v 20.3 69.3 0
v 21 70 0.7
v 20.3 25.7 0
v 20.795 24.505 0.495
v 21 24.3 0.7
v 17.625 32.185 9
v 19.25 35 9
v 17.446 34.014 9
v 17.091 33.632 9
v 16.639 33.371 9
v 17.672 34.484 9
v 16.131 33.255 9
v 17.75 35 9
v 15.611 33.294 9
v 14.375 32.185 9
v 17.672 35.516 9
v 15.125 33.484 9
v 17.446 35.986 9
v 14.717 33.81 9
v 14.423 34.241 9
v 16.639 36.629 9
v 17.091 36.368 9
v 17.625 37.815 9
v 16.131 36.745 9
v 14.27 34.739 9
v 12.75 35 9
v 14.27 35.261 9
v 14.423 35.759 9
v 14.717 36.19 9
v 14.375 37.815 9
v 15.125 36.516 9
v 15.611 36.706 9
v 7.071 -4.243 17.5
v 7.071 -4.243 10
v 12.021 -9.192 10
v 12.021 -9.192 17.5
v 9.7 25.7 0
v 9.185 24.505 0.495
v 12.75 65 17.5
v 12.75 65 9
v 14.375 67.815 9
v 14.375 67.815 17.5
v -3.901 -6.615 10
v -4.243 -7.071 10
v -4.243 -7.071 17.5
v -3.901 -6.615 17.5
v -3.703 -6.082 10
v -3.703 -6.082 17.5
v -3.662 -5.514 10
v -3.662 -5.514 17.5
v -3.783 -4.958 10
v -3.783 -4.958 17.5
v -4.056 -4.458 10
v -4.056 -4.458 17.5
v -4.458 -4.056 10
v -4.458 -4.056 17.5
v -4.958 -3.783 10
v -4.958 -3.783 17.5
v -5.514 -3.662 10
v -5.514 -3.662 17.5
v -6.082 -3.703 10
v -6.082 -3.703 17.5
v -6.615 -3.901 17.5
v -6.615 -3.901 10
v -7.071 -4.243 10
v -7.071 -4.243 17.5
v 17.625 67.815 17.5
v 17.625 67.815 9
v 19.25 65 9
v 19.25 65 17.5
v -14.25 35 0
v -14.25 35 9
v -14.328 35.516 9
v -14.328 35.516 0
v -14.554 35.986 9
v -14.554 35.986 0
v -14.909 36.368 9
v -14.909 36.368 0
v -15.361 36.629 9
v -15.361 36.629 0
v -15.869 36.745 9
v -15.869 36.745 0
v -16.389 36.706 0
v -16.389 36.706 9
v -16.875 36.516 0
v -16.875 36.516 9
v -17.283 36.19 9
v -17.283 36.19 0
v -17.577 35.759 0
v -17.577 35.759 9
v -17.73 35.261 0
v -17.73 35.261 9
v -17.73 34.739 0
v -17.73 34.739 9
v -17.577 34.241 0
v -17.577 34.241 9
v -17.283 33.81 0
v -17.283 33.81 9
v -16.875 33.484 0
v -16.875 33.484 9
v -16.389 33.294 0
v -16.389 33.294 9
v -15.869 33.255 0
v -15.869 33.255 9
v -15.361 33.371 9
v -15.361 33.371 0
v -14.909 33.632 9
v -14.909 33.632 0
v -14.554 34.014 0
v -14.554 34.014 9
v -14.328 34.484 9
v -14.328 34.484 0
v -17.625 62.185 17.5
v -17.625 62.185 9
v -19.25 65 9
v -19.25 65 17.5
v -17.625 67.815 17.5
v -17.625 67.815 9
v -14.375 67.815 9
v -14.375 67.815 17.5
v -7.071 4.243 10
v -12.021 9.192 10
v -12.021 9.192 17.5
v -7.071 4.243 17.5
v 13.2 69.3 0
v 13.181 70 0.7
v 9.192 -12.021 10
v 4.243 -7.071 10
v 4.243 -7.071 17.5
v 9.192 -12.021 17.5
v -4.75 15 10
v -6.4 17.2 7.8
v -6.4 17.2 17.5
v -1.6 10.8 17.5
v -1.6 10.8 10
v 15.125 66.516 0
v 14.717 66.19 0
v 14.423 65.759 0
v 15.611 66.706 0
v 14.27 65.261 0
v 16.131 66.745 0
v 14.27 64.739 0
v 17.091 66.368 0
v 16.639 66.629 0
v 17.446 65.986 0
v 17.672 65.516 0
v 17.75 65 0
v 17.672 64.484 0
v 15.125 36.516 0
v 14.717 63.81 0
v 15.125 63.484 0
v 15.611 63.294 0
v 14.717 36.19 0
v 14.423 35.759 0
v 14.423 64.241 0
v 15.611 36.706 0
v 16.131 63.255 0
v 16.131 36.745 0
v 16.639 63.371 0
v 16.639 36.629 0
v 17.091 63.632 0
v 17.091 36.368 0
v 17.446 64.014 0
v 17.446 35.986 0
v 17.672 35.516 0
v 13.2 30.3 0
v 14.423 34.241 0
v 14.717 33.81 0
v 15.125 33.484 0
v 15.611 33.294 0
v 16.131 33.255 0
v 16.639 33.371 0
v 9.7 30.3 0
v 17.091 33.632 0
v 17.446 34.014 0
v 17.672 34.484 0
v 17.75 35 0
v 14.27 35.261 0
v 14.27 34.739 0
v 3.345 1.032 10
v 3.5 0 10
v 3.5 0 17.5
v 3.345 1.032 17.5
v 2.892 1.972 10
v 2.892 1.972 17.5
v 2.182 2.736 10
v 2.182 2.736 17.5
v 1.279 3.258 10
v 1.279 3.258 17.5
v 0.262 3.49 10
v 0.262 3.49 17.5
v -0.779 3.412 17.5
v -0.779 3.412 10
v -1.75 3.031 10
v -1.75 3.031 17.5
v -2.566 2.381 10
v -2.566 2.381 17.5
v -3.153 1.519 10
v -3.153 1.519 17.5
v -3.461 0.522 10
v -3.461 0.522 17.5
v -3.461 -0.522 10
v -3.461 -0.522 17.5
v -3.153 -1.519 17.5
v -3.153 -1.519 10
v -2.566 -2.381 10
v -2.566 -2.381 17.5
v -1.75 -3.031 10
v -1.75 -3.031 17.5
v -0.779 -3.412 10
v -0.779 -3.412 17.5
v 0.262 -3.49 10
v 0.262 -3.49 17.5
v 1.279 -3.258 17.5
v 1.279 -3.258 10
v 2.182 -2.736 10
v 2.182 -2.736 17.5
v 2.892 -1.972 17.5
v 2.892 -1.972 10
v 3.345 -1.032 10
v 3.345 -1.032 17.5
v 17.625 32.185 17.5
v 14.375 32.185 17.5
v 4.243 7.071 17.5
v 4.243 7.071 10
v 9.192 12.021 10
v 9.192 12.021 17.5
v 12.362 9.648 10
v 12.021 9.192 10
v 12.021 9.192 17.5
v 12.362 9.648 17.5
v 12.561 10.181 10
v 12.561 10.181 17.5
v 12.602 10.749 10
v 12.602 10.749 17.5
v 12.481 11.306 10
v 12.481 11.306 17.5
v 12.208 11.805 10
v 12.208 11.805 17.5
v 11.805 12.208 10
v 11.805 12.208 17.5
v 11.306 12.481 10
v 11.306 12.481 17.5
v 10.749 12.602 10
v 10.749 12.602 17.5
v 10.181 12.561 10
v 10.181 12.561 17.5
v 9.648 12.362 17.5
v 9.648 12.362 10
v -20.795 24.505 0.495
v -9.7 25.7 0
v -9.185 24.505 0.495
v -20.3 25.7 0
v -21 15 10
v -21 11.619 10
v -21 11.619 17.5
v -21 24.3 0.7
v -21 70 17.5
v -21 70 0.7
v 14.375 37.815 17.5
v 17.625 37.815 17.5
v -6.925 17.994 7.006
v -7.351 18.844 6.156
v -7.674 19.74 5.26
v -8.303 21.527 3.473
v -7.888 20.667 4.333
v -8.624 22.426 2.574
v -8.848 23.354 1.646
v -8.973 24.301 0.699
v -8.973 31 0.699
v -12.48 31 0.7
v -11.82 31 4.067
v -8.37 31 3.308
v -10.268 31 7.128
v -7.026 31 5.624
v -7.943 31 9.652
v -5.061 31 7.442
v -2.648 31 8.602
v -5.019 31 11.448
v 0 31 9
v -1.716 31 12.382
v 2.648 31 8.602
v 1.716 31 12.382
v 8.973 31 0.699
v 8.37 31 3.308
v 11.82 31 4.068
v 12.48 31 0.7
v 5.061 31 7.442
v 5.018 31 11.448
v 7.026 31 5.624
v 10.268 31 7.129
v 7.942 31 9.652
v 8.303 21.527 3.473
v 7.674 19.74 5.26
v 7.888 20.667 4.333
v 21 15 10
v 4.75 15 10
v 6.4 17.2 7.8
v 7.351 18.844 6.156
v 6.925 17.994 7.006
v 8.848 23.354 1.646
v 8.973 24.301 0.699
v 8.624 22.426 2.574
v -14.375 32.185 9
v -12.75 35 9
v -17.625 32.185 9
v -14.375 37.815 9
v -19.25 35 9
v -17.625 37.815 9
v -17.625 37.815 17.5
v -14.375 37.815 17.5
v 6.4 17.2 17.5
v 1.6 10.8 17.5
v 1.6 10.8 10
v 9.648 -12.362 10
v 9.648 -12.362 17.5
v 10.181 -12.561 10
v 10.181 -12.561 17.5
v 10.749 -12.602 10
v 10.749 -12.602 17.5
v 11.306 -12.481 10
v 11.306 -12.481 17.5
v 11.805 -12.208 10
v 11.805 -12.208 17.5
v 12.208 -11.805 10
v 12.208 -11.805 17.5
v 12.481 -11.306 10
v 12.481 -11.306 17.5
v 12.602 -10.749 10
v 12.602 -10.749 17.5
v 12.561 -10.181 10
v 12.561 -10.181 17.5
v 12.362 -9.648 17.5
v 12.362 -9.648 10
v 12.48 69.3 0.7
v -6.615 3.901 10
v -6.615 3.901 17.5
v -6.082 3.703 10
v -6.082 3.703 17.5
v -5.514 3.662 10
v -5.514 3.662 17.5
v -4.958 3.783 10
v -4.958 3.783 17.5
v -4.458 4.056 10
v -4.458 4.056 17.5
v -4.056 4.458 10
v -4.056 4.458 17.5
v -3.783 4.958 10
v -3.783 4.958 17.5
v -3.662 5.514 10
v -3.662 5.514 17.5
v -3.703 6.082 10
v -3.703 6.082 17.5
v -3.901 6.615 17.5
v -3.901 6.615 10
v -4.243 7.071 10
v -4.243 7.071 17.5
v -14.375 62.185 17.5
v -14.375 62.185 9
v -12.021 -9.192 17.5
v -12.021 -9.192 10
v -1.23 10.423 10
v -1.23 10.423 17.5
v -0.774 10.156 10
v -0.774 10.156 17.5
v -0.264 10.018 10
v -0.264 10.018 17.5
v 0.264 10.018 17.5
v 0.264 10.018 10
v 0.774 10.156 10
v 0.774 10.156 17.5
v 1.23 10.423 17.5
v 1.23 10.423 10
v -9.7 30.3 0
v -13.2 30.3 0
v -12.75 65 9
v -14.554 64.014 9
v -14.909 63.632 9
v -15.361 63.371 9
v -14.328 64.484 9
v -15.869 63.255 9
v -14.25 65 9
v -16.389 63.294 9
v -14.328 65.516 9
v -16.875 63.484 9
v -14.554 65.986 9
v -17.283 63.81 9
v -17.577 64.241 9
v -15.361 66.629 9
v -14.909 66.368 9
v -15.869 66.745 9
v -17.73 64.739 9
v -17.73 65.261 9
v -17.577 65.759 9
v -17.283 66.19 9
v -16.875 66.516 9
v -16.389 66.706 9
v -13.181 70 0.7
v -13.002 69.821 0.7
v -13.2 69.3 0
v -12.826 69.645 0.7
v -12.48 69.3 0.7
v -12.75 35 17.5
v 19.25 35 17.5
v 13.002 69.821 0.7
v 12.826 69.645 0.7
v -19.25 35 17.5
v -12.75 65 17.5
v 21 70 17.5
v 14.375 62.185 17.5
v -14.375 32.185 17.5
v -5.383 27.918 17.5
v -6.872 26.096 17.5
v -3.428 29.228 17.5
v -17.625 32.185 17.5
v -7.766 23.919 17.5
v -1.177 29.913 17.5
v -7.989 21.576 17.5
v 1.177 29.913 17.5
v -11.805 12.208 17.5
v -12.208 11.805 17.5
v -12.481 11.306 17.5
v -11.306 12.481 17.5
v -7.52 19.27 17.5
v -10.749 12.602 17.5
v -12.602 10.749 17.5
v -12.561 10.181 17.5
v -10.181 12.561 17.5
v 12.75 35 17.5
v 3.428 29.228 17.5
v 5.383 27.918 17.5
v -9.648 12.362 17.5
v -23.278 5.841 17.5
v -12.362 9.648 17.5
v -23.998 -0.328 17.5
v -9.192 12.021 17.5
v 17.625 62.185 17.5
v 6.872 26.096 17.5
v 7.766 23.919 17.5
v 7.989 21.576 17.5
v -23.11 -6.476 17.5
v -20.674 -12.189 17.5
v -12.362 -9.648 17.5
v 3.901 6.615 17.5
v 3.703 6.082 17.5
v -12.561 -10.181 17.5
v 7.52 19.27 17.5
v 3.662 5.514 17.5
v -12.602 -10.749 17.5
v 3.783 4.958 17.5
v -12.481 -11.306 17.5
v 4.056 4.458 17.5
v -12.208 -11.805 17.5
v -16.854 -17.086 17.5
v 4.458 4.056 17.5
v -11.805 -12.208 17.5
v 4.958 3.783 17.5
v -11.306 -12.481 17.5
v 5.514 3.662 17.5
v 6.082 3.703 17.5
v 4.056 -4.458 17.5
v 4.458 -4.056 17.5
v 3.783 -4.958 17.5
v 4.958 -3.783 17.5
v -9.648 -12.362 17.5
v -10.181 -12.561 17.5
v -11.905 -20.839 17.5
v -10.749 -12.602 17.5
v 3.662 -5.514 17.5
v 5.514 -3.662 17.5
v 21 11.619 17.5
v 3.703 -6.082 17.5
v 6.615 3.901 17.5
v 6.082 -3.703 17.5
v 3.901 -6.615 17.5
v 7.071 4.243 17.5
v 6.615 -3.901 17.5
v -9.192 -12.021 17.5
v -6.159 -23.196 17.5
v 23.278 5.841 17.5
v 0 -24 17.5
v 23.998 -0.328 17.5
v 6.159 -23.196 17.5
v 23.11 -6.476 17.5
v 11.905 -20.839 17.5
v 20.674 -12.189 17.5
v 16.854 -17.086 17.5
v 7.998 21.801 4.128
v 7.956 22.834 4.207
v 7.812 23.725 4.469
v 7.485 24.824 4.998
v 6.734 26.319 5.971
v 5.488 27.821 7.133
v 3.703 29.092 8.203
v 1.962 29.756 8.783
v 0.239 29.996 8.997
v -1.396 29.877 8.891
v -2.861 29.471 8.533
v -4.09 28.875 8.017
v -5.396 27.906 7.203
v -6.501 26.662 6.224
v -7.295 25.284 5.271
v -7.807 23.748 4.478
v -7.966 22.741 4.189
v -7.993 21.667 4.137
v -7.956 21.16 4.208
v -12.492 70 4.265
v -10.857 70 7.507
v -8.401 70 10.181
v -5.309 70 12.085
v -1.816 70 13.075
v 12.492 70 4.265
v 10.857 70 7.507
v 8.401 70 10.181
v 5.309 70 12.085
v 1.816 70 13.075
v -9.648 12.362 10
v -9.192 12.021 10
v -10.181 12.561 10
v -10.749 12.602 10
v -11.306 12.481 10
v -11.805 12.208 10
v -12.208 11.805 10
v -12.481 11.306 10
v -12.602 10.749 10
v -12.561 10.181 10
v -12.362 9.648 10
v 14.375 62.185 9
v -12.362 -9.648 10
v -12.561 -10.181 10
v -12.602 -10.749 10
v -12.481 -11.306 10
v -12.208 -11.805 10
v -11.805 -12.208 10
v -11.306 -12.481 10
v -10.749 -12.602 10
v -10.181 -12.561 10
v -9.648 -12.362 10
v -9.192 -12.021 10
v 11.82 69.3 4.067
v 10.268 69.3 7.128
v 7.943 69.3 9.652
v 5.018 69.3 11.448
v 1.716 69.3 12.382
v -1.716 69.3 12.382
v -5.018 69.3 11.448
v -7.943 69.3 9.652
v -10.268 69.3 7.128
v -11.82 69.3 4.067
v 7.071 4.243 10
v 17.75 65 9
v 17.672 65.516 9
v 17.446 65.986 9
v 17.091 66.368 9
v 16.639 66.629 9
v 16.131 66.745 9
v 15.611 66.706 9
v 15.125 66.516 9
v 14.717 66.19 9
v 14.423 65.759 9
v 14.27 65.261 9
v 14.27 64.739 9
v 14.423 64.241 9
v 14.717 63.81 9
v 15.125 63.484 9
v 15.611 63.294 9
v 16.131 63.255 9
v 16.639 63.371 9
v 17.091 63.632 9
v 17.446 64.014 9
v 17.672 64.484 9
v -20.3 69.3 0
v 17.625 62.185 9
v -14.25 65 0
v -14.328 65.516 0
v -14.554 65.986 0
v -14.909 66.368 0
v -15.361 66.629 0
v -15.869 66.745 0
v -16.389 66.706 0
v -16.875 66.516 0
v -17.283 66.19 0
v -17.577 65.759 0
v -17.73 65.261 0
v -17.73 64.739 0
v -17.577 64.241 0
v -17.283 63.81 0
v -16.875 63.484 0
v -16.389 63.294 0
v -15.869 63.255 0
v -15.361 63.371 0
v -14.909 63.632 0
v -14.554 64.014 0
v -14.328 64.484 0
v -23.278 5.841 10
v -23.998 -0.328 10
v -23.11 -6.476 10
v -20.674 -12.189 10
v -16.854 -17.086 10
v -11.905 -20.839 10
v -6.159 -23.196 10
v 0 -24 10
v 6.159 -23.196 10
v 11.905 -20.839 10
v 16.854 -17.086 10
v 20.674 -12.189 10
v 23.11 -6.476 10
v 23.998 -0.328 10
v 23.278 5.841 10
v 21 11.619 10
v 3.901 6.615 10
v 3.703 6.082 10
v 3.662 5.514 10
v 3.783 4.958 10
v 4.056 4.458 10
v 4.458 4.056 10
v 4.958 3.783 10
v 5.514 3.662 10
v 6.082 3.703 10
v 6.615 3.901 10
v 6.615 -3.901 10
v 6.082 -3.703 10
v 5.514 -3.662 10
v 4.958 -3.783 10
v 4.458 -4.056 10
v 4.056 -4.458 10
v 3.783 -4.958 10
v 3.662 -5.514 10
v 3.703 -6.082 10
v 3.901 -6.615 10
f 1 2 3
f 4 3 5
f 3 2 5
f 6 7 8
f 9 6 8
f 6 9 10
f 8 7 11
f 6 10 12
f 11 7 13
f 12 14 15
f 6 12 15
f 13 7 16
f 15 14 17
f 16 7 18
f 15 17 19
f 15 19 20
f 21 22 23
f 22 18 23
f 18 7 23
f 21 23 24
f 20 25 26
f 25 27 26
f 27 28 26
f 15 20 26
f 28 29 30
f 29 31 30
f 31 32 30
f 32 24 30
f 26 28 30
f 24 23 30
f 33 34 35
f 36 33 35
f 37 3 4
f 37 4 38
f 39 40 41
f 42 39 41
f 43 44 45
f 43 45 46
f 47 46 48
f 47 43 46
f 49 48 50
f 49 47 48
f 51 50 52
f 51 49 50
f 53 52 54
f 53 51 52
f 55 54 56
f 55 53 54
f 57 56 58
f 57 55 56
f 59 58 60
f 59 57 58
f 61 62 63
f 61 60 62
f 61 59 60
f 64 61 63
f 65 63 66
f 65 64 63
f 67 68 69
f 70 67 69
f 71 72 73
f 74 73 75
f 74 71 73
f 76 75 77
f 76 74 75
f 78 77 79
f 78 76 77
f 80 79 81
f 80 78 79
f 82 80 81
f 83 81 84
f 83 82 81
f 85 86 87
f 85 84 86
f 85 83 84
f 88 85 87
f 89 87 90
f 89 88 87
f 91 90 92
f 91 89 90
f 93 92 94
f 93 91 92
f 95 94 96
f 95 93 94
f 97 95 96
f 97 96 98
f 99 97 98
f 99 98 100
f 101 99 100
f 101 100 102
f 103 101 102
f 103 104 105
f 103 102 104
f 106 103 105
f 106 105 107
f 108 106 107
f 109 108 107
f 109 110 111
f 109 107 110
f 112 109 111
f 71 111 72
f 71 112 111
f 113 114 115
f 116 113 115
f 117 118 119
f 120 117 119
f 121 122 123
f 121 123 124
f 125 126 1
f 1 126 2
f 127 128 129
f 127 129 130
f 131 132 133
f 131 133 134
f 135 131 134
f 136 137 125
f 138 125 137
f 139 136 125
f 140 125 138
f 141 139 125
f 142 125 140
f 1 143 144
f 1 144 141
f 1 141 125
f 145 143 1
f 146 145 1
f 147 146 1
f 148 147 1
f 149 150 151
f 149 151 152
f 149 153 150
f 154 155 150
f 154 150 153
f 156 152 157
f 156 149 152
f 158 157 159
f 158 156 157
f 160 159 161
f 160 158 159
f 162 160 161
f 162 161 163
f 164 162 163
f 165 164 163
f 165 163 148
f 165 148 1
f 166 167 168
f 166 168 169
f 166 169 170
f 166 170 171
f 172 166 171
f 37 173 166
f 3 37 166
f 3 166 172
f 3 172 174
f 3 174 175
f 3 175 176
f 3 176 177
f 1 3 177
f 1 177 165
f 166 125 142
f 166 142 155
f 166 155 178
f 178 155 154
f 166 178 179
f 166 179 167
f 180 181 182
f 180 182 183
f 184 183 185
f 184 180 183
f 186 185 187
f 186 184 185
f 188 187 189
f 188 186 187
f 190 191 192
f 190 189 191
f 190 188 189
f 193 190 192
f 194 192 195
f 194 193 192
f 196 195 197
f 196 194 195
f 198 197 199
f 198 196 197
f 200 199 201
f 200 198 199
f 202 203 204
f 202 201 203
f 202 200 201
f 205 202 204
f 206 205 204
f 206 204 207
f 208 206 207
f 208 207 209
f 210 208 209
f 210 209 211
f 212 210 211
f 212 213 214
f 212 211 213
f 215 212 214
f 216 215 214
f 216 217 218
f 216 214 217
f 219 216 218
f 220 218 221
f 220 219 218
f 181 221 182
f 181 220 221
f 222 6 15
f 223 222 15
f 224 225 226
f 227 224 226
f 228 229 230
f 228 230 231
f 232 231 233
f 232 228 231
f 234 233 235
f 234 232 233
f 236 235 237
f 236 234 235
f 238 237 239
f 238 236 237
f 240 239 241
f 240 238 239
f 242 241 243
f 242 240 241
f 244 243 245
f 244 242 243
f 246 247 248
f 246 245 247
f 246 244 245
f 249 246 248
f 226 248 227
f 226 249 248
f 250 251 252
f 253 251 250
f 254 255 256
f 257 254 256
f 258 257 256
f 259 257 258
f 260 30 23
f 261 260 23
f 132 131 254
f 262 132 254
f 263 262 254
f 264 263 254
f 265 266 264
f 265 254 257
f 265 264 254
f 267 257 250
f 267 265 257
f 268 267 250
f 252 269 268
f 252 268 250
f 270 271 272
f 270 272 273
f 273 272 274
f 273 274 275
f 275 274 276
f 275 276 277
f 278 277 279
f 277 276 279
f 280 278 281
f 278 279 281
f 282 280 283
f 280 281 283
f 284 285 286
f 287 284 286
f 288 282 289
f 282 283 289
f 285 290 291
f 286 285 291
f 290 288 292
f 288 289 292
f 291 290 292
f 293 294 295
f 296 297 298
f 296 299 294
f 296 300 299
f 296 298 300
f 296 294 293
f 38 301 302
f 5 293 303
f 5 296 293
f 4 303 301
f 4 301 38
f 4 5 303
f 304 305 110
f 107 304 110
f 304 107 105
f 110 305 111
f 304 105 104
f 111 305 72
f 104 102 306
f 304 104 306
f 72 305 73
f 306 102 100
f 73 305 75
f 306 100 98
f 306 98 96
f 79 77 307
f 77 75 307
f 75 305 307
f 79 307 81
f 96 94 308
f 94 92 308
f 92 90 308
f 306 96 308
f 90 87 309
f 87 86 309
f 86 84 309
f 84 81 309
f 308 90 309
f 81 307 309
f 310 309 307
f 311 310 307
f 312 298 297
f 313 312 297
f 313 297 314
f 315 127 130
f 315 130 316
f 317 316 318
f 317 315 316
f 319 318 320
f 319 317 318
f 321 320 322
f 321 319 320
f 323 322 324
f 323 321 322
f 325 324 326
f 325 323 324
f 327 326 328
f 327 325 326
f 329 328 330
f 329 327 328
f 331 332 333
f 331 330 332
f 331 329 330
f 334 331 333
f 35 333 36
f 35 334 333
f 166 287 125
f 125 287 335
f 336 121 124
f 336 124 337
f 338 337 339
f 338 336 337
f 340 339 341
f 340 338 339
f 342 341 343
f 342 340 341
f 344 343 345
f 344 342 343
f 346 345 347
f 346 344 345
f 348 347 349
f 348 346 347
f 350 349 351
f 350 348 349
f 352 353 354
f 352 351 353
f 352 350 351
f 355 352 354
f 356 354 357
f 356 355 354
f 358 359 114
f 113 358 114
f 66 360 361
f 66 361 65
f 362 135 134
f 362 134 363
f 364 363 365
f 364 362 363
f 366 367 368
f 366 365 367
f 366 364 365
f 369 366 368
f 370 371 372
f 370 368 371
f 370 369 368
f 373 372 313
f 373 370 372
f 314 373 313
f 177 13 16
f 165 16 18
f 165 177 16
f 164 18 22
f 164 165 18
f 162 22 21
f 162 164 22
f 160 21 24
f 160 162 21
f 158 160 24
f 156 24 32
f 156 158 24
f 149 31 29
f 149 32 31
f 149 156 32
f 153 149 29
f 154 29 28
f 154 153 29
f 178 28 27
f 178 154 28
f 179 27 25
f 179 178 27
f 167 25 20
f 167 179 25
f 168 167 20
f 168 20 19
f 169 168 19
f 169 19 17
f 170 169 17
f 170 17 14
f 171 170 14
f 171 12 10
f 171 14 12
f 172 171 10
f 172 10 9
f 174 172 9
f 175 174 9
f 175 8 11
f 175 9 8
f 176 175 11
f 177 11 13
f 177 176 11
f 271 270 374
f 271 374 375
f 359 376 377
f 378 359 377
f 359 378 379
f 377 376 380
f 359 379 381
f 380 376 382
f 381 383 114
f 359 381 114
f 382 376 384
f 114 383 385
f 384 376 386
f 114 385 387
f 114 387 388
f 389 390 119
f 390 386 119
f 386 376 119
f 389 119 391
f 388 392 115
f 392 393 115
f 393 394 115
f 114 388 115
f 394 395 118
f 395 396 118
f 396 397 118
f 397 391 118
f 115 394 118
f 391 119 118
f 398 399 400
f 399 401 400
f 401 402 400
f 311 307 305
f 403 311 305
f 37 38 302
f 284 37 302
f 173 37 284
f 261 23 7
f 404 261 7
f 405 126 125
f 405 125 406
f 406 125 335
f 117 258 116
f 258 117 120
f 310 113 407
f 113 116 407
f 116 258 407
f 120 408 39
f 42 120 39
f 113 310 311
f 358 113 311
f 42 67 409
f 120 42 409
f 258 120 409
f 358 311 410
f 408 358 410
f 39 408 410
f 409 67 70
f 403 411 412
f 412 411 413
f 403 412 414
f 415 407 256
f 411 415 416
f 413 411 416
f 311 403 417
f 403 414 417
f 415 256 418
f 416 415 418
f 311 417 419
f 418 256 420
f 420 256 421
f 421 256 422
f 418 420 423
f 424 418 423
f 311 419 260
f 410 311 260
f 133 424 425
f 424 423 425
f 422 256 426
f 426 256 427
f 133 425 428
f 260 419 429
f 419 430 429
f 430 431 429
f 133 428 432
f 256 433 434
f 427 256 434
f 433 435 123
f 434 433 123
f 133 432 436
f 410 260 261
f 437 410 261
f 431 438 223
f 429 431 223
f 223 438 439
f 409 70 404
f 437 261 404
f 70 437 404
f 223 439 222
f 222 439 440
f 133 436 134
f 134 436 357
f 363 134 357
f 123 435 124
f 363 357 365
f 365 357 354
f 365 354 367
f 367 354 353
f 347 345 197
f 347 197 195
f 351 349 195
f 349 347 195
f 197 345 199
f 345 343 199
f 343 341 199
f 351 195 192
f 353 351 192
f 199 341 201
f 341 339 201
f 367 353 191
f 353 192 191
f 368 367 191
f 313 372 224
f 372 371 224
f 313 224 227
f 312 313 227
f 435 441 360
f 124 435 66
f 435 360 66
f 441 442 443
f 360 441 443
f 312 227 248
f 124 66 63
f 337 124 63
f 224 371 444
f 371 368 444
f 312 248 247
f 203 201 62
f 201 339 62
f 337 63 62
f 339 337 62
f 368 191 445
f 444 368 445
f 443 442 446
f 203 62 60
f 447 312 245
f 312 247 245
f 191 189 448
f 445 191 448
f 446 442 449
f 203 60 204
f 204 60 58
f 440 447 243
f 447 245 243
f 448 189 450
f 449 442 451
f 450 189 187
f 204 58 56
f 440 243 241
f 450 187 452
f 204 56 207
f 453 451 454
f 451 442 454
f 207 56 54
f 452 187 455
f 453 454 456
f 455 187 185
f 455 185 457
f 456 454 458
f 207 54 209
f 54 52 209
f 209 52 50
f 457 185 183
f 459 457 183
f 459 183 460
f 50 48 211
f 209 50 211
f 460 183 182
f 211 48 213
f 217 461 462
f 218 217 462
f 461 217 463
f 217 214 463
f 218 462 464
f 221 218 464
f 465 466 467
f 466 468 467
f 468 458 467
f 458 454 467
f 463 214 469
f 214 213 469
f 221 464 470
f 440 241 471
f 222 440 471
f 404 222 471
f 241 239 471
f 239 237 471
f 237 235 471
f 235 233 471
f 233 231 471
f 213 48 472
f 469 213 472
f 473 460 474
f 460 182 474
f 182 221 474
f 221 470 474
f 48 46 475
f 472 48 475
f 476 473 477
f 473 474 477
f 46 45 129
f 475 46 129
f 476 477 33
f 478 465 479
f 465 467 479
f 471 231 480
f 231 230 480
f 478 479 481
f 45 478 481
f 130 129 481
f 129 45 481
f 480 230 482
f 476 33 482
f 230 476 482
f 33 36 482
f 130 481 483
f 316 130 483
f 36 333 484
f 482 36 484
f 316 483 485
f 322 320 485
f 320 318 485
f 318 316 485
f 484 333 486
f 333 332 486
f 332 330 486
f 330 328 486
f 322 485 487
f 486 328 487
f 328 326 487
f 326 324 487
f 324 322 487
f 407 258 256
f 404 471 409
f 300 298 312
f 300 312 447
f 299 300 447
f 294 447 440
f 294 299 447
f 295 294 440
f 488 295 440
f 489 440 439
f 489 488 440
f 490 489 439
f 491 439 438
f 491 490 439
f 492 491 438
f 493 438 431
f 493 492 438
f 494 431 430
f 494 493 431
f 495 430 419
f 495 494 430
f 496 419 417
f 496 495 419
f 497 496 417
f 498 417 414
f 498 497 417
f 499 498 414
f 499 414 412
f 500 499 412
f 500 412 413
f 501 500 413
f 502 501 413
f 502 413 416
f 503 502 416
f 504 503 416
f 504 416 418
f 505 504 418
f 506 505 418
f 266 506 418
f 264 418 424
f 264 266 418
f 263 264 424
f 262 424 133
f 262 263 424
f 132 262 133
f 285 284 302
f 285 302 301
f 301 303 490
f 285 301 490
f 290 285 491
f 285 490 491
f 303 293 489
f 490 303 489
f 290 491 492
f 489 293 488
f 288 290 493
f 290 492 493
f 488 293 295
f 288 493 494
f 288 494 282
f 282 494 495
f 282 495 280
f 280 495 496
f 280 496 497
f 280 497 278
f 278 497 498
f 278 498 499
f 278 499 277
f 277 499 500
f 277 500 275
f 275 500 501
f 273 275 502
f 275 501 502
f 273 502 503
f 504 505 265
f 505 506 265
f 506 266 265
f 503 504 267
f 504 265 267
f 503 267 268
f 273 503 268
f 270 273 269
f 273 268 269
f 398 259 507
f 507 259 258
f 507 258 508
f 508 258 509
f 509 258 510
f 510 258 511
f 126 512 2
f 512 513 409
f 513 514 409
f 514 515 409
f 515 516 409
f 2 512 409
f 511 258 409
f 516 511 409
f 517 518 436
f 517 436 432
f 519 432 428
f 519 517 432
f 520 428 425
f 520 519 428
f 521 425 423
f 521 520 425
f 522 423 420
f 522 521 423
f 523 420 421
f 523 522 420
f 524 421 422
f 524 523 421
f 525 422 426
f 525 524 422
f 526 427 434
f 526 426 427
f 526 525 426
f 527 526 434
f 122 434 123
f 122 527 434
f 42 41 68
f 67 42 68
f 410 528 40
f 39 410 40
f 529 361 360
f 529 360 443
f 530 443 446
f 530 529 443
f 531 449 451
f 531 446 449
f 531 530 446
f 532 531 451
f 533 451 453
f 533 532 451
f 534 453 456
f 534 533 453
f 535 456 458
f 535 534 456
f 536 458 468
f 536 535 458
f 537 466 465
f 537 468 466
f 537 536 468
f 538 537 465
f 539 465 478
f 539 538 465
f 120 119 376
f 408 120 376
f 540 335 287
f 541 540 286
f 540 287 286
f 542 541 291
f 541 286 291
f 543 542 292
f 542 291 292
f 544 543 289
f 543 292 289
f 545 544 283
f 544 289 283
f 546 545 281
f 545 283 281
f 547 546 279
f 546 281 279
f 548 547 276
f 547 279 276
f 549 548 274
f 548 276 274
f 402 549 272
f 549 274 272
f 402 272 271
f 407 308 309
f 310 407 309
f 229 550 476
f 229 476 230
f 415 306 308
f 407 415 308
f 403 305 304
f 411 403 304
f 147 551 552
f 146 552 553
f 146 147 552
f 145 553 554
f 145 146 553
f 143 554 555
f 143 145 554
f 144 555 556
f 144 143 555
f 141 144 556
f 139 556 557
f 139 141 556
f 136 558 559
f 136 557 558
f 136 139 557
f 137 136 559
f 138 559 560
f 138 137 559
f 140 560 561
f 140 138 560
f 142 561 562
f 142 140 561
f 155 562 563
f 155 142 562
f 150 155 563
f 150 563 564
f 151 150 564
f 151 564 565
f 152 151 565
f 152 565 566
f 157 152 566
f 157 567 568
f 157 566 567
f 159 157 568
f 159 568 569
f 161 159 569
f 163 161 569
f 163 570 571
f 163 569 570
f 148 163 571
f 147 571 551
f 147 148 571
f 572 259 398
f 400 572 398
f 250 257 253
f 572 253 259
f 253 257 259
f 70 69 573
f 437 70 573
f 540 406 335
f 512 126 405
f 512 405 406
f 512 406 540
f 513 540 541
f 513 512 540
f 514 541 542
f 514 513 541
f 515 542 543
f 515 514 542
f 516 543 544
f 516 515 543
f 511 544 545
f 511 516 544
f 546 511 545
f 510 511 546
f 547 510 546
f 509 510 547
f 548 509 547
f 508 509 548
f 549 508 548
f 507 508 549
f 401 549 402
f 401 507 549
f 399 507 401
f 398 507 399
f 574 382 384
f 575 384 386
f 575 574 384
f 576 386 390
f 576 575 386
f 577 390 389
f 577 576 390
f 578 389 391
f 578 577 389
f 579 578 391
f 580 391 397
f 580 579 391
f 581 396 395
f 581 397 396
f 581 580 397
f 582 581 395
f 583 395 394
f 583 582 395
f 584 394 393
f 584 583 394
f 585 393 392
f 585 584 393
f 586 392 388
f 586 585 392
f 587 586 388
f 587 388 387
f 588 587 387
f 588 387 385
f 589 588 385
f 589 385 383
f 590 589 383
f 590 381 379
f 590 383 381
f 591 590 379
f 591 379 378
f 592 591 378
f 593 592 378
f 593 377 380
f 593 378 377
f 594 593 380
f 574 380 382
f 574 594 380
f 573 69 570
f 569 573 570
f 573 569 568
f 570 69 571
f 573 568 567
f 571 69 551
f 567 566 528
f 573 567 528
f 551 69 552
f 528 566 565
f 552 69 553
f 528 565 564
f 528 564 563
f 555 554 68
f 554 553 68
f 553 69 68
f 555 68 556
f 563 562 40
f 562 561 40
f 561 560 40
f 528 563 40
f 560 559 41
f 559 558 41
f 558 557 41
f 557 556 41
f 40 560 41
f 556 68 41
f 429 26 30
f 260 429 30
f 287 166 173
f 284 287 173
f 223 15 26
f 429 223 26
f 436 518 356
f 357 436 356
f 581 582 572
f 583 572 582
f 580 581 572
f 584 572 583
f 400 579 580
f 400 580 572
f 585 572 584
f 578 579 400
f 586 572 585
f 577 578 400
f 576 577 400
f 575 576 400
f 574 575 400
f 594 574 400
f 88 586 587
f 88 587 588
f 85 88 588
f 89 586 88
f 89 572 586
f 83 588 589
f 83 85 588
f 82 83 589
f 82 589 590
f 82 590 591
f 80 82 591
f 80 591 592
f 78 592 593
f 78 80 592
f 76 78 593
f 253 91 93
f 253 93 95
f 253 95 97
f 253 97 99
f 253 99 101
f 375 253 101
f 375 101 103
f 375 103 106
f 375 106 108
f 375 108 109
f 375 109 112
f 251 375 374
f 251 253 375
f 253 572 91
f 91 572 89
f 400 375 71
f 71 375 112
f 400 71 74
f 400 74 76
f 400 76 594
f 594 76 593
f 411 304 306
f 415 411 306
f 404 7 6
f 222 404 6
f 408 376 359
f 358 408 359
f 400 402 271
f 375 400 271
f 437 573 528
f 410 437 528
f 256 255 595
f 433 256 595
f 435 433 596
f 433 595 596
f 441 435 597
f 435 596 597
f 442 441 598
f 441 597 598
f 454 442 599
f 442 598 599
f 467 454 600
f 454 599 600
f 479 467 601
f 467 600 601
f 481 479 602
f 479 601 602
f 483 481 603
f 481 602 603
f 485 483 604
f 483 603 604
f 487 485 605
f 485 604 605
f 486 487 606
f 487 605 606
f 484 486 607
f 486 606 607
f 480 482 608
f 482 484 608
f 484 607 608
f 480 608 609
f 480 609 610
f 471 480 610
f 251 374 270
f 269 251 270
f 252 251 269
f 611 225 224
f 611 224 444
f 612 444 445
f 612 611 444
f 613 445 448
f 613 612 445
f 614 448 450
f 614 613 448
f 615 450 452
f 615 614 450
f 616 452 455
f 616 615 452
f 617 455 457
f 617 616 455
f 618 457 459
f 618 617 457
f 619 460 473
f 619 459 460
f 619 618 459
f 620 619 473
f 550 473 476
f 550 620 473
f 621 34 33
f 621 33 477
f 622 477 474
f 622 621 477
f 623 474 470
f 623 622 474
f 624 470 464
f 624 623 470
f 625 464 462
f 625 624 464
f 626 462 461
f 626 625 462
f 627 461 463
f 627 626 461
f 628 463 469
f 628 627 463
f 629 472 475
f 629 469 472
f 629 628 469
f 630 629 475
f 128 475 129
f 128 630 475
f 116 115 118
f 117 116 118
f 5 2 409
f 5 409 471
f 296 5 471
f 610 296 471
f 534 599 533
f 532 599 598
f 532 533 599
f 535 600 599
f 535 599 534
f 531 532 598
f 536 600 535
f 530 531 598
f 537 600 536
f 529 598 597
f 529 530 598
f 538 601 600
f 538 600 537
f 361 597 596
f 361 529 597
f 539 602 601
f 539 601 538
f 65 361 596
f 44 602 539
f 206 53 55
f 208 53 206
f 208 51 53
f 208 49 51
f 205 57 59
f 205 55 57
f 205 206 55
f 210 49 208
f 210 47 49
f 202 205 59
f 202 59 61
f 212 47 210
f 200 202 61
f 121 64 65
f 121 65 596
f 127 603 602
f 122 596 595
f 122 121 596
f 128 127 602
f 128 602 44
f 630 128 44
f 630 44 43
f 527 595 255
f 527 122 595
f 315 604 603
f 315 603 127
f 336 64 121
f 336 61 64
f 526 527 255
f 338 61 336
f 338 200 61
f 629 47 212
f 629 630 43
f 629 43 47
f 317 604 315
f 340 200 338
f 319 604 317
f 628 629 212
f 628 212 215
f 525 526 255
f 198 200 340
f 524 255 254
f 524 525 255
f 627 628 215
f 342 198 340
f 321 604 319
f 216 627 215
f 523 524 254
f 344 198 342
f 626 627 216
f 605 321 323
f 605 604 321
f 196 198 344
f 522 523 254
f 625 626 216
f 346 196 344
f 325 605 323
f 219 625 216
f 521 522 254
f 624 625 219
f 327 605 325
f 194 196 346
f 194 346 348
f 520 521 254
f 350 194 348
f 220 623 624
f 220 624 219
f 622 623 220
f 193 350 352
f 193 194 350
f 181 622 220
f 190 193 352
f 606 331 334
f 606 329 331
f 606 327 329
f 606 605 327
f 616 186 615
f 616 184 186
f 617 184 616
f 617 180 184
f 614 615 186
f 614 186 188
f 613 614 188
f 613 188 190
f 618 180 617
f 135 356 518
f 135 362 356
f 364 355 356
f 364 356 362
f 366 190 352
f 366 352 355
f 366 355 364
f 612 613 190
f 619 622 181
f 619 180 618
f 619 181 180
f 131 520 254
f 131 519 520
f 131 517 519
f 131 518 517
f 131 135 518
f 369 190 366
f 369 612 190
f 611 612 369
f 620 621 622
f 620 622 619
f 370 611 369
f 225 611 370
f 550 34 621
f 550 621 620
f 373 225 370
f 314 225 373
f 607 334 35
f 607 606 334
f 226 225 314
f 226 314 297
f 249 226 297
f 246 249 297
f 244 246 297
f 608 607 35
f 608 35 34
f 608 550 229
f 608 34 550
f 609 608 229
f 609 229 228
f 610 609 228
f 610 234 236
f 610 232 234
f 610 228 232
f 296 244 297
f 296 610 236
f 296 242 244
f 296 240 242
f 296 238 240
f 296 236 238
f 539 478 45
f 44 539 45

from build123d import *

# Parameters (mm, degrees)
EXTRUDE006_DEPTH                     = 10
SKETCH006_AS_DRAWN_R                 = 9
EXTRUDE005_DEPTH                     = 27
EXTRUDE005_ONTO_SKETCH006_ROLL_ANGLE = 90
SKETCH_R                             = 3.5
SKETCH_R_2                           = 1.75
EXTRUDE_DEPTH                        = 30
SKETCH001_AS_DRAWN_R                 = 12.5
EXTRUDE004_DEPTH                     = 50
EXTRUDE004_ONTO_SKETCH001_ROLL_ANGLE = 90
EXTRUDE002_DEPTH                     = 60
SKETCH003_AS_DRAWN_W                 = 50
SKETCH003_AS_DRAWN_H                 = 17.5
EXTRUDE003_DEPTH                     = 98
EXTRUDE003_ONTO_SKETCH003_ROLL_ANGLE = 90
CHAMFER_SIZE                         = 0.7


with BuildPart() as extrude006:
    # Sketch008 → Extrude006 (new body)
    with BuildSketch(Plane(origin=(0, 40, 0), x_dir=(1, 0, 0), z_dir=(0, 0, 1))):
        Polygon((-17.625, -2.185417), (-14.375, -2.185417), (-12.75, -5), (-14.375, -7.814583), (-17.625, -7.814583), (-19.25, -5), align=None)
        Polygon((14.375, -2.185417), (17.625, -2.185417), (19.25, -5), (17.625, -7.814583), (14.375, -7.814583), (12.75, -5), align=None)
        Polygon((14.375, 27.814583), (17.625, 27.814583), (19.25, 25), (17.625, 22.185417), (14.375, 22.185417), (12.75, 25), align=None)
        Polygon((-17.625, 27.814583), (-14.375, 27.814583), (-12.75, 25), (-14.375, 22.185417), (-17.625, 22.185417), (-19.25, 25), align=None)
    extrude(amount=EXTRUDE006_DEPTH)


with BuildPart() as extrude006_1:
    # Extrude006 placement: moved
    add(extrude006.part.moved(Location((0, 0, 9))))


with BuildPart() as extrude005:
    # Sketch006 as drawn → Extrude005 (new)
    with BuildSketch(Plane.XY):
        Circle(SKETCH006_AS_DRAWN_R)
    extrude(amount=-EXTRUDE005_DEPTH)


with BuildPart() as extrude005_1:
    # Extrude005 onto Sketch006 roll: moved
    add(extrude005.part.rotate(Axis((0, 0, 0), (1, 0, 0)), EXTRUDE005_ONTO_SKETCH006_ROLL_ANGLE))


with BuildPart() as extrude005_2:
    # Extrude005 onto Sketch006 placement: moved
    add(extrude005_1.part.moved(Location((0, 33, 0))))


with BuildPart() as extrude005_3:
    # Extrude005 placement: moved
    add(extrude005_2.part.moved(Location((0, -18, 0))))


with BuildPart() as extrude_body:
    # Sketch → Extrude (new body)
    with BuildSketch(Plane.XY):
        Circle(SKETCH_R)
        with Locations((-16, 35)):
            Circle(SKETCH_R_2)
        with Locations((-16, 65)):
            Circle(SKETCH_R_2)
        with Locations((16, 65)):
            Circle(SKETCH_R_2)
        with Locations((16, 35)):
            Circle(SKETCH_R_2)
        with BuildLine():
            ThreePointArc((-12.020815, -9.192388), (-12.020815, -12.020815), (-9.192388, -12.020815))
            Line((-9.192388, -12.020815), (-4.242641, -7.071068))
            ThreePointArc((-4.242641, -7.071068), (-4.242641, -4.242641), (-7.071068, -4.242641))
            Line((-12.020815, -9.192388), (-7.071068, -4.242641))
        make_face()
        with BuildLine():
            ThreePointArc((7.071068, -4.242641), (4.242641, -4.242641), (4.242641, -7.071068))
            Line((4.242641, -7.071068), (9.192388, -12.020815))
            ThreePointArc((9.192388, -12.020815), (12.020815, -12.020815), (12.020815, -9.192388))
            Line((7.071068, -4.242641), (12.020815, -9.192388))
        make_face()
        with BuildLine():
            ThreePointArc((4.242641, 7.071068), (4.242641, 4.242641), (7.071068, 4.242641))
            Line((7.071068, 4.242641), (12.020815, 9.192388))
            ThreePointArc((12.020815, 9.192388), (12.020815, 12.020815), (9.192388, 12.020815))
            Line((4.242641, 7.071068), (9.192388, 12.020815))
        make_face()
        with BuildLine():
            ThreePointArc((-9.192388, 12.020815), (-12.020815, 12.020815), (-12.020815, 9.192388))
            Line((-12.020815, 9.192388), (-7.071068, 4.242641))
            ThreePointArc((-7.071068, 4.242641), (-4.242641, 4.242641), (-4.242641, 7.071068))
            Line((-9.192388, 12.020815), (-4.242641, 7.071068))
        make_face()
        with BuildLine():
            ThreePointArc((6.4, 17.2), (0, 30), (-6.4, 17.2))
            Line((-6.4, 17.2), (-1.6, 10.8))
            ThreePointArc((-1.6, 10.8), (0, 10), (1.6, 10.8))
            Line((6.4, 17.2), (1.6, 10.8))
        make_face()
        with BuildLine():
            ThreePointArc((-21, 11.61895), (0, -24), (21, 11.61895))
            Line((21, 70), (21, 11.61895))
            Line((30, 70), (21, 70))
            Line((30, -30), (30, 70))
            Line((-30, -30), (30, -30))
            Line((-30, 70), (-30, -30))
            Line((-21, 70), (-30, 70))
            Line((-21, 11.61895), (-21, 70))
        make_face()
    extrude(amount=EXTRUDE_DEPTH)


with BuildPart() as extrude004:
    # Sketch001 as drawn → Extrude004 (new)
    with BuildSketch(Plane.XY):
        Circle(SKETCH001_AS_DRAWN_R)
    extrude(amount=-EXTRUDE004_DEPTH)


with BuildPart() as extrude004_1:
    # Extrude004 onto Sketch001 roll: moved
    add(extrude004.part.rotate(Axis((0, 0, 0), (1, 0, 0)), EXTRUDE004_ONTO_SKETCH001_ROLL_ANGLE))


with BuildPart() as extrude004_2:
    # Extrude004 onto Sketch001 placement: moved
    add(extrude004_1.part.moved(Location((0, 32, 0))))


with BuildPart() as extrude004_3:
    # Extrude004 placement: moved
    add(extrude004_2.part.moved(Location((0, -1, 0))))


with BuildPart() as extrude002:
    # Sketch002 → Extrude002 (new body)
    with BuildSketch(Plane.YZ.offset(33)):
        Polygon((-30, 10), (15, 10), (25, 0), (-30, 0), align=None)
    extrude(amount=-EXTRUDE002_DEPTH)


with BuildPart() as chamfer_body:
    # Sketch003 as drawn → Extrude003 (new)
    with BuildSketch(Plane.XY):
        with Locations((0, 8.75)):
            Rectangle(SKETCH003_AS_DRAWN_W, SKETCH003_AS_DRAWN_H)
    extrude(amount=-EXTRUDE003_DEPTH)


with BuildPart() as chamfer_body_1:
    # Extrude003 onto Sketch003 roll: moved
    add(chamfer_body.part.rotate(Axis((0, 0, 0), (1, 0, 0)), EXTRUDE003_ONTO_SKETCH003_ROLL_ANGLE))


with BuildPart() as chamfer_body_2:
    # Extrude003 onto Sketch003 placement: moved
    add(chamfer_body_1.part.moved(Location((0, -28, 0))))

    # Cut: cut Extrude002
    add(extrude002.part, mode=Mode.SUBTRACT)

    # Cut001: cut Extrude004
    add(extrude004_3.part, mode=Mode.SUBTRACT)

    # Cut002: cut Extrude body
    add(extrude_body.part, mode=Mode.SUBTRACT)

    # Cut003: cut Extrude005
    add(extrude005_3.part, mode=Mode.SUBTRACT)

    # Cut004: cut Extrude006
    add(extrude006_1.part, mode=Mode.SUBTRACT)

    # Chamfer
    chamfer_edges = [chamfer_body_2.edges().sort_by_distance(p)[0] for p in [
        (-21, 47.5, 0),
        (16.75, 70, 0),
        (0, 70, 12.5),
        (-16.75, 70, 0),
        (21, 47.5, 0),
        (-15, 25, 0),
        (-9, 28, 0),
        (-12.5, 50.5, 0),
        (-10.75, 31, 0),
        (15, 25, 0),
        (9, 28, 0),
        (10.75, 31, 0),
        (12.5, 50.5, 0),
    ]]
    chamfer(chamfer_edges, length=CHAMFER_SIZE)


solid = chamfer_body_2.part
